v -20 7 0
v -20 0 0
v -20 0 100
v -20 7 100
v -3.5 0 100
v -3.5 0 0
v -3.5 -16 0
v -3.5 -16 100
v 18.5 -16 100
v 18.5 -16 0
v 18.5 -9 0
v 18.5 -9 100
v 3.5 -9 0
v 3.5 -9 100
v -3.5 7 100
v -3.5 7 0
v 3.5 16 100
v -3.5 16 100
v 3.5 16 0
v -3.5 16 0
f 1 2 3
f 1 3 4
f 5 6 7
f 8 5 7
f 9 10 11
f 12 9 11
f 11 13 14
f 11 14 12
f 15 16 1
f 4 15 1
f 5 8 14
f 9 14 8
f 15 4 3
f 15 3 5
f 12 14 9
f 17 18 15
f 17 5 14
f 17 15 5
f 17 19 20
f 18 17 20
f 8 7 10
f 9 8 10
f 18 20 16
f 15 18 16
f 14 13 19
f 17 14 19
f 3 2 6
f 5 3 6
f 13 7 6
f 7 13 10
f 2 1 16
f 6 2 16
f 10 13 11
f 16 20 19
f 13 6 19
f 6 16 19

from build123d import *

# Parameters (mm, degrees)
SKETCH_1_W      = 16.5
SKETCH_1_H      = 7
SKETCH_1_W_2    = 3.5
SKETCH_1_W_3    = 15
EXTRUDE_1_DEPTH = 100


with BuildPart() as part:
    # Эскиз1 → Бобышка-Вытянуть1 (new body)
    with BuildSketch(Plane.XY):
        with Locations((-11.75, 3.5)):
            Rectangle(SKETCH_1_W, SKETCH_1_H)
        with Locations((-1.75, 3.5)):
            Rectangle(SKETCH_1_W_2, SKETCH_1_H)
        Polygon((-3.5, 0), (-3.5, -16), (3.5, -16), (3.5, -9), (3.5, 16), (-3.5, 16), (-3.5, 7), (0, 7), (0, 0), align=None)
        with Locations((11, -12.5)):
            Rectangle(SKETCH_1_W_3, SKETCH_1_H)
    extrude(amount=EXTRUDE_1_DEPTH)


solid = part.part
